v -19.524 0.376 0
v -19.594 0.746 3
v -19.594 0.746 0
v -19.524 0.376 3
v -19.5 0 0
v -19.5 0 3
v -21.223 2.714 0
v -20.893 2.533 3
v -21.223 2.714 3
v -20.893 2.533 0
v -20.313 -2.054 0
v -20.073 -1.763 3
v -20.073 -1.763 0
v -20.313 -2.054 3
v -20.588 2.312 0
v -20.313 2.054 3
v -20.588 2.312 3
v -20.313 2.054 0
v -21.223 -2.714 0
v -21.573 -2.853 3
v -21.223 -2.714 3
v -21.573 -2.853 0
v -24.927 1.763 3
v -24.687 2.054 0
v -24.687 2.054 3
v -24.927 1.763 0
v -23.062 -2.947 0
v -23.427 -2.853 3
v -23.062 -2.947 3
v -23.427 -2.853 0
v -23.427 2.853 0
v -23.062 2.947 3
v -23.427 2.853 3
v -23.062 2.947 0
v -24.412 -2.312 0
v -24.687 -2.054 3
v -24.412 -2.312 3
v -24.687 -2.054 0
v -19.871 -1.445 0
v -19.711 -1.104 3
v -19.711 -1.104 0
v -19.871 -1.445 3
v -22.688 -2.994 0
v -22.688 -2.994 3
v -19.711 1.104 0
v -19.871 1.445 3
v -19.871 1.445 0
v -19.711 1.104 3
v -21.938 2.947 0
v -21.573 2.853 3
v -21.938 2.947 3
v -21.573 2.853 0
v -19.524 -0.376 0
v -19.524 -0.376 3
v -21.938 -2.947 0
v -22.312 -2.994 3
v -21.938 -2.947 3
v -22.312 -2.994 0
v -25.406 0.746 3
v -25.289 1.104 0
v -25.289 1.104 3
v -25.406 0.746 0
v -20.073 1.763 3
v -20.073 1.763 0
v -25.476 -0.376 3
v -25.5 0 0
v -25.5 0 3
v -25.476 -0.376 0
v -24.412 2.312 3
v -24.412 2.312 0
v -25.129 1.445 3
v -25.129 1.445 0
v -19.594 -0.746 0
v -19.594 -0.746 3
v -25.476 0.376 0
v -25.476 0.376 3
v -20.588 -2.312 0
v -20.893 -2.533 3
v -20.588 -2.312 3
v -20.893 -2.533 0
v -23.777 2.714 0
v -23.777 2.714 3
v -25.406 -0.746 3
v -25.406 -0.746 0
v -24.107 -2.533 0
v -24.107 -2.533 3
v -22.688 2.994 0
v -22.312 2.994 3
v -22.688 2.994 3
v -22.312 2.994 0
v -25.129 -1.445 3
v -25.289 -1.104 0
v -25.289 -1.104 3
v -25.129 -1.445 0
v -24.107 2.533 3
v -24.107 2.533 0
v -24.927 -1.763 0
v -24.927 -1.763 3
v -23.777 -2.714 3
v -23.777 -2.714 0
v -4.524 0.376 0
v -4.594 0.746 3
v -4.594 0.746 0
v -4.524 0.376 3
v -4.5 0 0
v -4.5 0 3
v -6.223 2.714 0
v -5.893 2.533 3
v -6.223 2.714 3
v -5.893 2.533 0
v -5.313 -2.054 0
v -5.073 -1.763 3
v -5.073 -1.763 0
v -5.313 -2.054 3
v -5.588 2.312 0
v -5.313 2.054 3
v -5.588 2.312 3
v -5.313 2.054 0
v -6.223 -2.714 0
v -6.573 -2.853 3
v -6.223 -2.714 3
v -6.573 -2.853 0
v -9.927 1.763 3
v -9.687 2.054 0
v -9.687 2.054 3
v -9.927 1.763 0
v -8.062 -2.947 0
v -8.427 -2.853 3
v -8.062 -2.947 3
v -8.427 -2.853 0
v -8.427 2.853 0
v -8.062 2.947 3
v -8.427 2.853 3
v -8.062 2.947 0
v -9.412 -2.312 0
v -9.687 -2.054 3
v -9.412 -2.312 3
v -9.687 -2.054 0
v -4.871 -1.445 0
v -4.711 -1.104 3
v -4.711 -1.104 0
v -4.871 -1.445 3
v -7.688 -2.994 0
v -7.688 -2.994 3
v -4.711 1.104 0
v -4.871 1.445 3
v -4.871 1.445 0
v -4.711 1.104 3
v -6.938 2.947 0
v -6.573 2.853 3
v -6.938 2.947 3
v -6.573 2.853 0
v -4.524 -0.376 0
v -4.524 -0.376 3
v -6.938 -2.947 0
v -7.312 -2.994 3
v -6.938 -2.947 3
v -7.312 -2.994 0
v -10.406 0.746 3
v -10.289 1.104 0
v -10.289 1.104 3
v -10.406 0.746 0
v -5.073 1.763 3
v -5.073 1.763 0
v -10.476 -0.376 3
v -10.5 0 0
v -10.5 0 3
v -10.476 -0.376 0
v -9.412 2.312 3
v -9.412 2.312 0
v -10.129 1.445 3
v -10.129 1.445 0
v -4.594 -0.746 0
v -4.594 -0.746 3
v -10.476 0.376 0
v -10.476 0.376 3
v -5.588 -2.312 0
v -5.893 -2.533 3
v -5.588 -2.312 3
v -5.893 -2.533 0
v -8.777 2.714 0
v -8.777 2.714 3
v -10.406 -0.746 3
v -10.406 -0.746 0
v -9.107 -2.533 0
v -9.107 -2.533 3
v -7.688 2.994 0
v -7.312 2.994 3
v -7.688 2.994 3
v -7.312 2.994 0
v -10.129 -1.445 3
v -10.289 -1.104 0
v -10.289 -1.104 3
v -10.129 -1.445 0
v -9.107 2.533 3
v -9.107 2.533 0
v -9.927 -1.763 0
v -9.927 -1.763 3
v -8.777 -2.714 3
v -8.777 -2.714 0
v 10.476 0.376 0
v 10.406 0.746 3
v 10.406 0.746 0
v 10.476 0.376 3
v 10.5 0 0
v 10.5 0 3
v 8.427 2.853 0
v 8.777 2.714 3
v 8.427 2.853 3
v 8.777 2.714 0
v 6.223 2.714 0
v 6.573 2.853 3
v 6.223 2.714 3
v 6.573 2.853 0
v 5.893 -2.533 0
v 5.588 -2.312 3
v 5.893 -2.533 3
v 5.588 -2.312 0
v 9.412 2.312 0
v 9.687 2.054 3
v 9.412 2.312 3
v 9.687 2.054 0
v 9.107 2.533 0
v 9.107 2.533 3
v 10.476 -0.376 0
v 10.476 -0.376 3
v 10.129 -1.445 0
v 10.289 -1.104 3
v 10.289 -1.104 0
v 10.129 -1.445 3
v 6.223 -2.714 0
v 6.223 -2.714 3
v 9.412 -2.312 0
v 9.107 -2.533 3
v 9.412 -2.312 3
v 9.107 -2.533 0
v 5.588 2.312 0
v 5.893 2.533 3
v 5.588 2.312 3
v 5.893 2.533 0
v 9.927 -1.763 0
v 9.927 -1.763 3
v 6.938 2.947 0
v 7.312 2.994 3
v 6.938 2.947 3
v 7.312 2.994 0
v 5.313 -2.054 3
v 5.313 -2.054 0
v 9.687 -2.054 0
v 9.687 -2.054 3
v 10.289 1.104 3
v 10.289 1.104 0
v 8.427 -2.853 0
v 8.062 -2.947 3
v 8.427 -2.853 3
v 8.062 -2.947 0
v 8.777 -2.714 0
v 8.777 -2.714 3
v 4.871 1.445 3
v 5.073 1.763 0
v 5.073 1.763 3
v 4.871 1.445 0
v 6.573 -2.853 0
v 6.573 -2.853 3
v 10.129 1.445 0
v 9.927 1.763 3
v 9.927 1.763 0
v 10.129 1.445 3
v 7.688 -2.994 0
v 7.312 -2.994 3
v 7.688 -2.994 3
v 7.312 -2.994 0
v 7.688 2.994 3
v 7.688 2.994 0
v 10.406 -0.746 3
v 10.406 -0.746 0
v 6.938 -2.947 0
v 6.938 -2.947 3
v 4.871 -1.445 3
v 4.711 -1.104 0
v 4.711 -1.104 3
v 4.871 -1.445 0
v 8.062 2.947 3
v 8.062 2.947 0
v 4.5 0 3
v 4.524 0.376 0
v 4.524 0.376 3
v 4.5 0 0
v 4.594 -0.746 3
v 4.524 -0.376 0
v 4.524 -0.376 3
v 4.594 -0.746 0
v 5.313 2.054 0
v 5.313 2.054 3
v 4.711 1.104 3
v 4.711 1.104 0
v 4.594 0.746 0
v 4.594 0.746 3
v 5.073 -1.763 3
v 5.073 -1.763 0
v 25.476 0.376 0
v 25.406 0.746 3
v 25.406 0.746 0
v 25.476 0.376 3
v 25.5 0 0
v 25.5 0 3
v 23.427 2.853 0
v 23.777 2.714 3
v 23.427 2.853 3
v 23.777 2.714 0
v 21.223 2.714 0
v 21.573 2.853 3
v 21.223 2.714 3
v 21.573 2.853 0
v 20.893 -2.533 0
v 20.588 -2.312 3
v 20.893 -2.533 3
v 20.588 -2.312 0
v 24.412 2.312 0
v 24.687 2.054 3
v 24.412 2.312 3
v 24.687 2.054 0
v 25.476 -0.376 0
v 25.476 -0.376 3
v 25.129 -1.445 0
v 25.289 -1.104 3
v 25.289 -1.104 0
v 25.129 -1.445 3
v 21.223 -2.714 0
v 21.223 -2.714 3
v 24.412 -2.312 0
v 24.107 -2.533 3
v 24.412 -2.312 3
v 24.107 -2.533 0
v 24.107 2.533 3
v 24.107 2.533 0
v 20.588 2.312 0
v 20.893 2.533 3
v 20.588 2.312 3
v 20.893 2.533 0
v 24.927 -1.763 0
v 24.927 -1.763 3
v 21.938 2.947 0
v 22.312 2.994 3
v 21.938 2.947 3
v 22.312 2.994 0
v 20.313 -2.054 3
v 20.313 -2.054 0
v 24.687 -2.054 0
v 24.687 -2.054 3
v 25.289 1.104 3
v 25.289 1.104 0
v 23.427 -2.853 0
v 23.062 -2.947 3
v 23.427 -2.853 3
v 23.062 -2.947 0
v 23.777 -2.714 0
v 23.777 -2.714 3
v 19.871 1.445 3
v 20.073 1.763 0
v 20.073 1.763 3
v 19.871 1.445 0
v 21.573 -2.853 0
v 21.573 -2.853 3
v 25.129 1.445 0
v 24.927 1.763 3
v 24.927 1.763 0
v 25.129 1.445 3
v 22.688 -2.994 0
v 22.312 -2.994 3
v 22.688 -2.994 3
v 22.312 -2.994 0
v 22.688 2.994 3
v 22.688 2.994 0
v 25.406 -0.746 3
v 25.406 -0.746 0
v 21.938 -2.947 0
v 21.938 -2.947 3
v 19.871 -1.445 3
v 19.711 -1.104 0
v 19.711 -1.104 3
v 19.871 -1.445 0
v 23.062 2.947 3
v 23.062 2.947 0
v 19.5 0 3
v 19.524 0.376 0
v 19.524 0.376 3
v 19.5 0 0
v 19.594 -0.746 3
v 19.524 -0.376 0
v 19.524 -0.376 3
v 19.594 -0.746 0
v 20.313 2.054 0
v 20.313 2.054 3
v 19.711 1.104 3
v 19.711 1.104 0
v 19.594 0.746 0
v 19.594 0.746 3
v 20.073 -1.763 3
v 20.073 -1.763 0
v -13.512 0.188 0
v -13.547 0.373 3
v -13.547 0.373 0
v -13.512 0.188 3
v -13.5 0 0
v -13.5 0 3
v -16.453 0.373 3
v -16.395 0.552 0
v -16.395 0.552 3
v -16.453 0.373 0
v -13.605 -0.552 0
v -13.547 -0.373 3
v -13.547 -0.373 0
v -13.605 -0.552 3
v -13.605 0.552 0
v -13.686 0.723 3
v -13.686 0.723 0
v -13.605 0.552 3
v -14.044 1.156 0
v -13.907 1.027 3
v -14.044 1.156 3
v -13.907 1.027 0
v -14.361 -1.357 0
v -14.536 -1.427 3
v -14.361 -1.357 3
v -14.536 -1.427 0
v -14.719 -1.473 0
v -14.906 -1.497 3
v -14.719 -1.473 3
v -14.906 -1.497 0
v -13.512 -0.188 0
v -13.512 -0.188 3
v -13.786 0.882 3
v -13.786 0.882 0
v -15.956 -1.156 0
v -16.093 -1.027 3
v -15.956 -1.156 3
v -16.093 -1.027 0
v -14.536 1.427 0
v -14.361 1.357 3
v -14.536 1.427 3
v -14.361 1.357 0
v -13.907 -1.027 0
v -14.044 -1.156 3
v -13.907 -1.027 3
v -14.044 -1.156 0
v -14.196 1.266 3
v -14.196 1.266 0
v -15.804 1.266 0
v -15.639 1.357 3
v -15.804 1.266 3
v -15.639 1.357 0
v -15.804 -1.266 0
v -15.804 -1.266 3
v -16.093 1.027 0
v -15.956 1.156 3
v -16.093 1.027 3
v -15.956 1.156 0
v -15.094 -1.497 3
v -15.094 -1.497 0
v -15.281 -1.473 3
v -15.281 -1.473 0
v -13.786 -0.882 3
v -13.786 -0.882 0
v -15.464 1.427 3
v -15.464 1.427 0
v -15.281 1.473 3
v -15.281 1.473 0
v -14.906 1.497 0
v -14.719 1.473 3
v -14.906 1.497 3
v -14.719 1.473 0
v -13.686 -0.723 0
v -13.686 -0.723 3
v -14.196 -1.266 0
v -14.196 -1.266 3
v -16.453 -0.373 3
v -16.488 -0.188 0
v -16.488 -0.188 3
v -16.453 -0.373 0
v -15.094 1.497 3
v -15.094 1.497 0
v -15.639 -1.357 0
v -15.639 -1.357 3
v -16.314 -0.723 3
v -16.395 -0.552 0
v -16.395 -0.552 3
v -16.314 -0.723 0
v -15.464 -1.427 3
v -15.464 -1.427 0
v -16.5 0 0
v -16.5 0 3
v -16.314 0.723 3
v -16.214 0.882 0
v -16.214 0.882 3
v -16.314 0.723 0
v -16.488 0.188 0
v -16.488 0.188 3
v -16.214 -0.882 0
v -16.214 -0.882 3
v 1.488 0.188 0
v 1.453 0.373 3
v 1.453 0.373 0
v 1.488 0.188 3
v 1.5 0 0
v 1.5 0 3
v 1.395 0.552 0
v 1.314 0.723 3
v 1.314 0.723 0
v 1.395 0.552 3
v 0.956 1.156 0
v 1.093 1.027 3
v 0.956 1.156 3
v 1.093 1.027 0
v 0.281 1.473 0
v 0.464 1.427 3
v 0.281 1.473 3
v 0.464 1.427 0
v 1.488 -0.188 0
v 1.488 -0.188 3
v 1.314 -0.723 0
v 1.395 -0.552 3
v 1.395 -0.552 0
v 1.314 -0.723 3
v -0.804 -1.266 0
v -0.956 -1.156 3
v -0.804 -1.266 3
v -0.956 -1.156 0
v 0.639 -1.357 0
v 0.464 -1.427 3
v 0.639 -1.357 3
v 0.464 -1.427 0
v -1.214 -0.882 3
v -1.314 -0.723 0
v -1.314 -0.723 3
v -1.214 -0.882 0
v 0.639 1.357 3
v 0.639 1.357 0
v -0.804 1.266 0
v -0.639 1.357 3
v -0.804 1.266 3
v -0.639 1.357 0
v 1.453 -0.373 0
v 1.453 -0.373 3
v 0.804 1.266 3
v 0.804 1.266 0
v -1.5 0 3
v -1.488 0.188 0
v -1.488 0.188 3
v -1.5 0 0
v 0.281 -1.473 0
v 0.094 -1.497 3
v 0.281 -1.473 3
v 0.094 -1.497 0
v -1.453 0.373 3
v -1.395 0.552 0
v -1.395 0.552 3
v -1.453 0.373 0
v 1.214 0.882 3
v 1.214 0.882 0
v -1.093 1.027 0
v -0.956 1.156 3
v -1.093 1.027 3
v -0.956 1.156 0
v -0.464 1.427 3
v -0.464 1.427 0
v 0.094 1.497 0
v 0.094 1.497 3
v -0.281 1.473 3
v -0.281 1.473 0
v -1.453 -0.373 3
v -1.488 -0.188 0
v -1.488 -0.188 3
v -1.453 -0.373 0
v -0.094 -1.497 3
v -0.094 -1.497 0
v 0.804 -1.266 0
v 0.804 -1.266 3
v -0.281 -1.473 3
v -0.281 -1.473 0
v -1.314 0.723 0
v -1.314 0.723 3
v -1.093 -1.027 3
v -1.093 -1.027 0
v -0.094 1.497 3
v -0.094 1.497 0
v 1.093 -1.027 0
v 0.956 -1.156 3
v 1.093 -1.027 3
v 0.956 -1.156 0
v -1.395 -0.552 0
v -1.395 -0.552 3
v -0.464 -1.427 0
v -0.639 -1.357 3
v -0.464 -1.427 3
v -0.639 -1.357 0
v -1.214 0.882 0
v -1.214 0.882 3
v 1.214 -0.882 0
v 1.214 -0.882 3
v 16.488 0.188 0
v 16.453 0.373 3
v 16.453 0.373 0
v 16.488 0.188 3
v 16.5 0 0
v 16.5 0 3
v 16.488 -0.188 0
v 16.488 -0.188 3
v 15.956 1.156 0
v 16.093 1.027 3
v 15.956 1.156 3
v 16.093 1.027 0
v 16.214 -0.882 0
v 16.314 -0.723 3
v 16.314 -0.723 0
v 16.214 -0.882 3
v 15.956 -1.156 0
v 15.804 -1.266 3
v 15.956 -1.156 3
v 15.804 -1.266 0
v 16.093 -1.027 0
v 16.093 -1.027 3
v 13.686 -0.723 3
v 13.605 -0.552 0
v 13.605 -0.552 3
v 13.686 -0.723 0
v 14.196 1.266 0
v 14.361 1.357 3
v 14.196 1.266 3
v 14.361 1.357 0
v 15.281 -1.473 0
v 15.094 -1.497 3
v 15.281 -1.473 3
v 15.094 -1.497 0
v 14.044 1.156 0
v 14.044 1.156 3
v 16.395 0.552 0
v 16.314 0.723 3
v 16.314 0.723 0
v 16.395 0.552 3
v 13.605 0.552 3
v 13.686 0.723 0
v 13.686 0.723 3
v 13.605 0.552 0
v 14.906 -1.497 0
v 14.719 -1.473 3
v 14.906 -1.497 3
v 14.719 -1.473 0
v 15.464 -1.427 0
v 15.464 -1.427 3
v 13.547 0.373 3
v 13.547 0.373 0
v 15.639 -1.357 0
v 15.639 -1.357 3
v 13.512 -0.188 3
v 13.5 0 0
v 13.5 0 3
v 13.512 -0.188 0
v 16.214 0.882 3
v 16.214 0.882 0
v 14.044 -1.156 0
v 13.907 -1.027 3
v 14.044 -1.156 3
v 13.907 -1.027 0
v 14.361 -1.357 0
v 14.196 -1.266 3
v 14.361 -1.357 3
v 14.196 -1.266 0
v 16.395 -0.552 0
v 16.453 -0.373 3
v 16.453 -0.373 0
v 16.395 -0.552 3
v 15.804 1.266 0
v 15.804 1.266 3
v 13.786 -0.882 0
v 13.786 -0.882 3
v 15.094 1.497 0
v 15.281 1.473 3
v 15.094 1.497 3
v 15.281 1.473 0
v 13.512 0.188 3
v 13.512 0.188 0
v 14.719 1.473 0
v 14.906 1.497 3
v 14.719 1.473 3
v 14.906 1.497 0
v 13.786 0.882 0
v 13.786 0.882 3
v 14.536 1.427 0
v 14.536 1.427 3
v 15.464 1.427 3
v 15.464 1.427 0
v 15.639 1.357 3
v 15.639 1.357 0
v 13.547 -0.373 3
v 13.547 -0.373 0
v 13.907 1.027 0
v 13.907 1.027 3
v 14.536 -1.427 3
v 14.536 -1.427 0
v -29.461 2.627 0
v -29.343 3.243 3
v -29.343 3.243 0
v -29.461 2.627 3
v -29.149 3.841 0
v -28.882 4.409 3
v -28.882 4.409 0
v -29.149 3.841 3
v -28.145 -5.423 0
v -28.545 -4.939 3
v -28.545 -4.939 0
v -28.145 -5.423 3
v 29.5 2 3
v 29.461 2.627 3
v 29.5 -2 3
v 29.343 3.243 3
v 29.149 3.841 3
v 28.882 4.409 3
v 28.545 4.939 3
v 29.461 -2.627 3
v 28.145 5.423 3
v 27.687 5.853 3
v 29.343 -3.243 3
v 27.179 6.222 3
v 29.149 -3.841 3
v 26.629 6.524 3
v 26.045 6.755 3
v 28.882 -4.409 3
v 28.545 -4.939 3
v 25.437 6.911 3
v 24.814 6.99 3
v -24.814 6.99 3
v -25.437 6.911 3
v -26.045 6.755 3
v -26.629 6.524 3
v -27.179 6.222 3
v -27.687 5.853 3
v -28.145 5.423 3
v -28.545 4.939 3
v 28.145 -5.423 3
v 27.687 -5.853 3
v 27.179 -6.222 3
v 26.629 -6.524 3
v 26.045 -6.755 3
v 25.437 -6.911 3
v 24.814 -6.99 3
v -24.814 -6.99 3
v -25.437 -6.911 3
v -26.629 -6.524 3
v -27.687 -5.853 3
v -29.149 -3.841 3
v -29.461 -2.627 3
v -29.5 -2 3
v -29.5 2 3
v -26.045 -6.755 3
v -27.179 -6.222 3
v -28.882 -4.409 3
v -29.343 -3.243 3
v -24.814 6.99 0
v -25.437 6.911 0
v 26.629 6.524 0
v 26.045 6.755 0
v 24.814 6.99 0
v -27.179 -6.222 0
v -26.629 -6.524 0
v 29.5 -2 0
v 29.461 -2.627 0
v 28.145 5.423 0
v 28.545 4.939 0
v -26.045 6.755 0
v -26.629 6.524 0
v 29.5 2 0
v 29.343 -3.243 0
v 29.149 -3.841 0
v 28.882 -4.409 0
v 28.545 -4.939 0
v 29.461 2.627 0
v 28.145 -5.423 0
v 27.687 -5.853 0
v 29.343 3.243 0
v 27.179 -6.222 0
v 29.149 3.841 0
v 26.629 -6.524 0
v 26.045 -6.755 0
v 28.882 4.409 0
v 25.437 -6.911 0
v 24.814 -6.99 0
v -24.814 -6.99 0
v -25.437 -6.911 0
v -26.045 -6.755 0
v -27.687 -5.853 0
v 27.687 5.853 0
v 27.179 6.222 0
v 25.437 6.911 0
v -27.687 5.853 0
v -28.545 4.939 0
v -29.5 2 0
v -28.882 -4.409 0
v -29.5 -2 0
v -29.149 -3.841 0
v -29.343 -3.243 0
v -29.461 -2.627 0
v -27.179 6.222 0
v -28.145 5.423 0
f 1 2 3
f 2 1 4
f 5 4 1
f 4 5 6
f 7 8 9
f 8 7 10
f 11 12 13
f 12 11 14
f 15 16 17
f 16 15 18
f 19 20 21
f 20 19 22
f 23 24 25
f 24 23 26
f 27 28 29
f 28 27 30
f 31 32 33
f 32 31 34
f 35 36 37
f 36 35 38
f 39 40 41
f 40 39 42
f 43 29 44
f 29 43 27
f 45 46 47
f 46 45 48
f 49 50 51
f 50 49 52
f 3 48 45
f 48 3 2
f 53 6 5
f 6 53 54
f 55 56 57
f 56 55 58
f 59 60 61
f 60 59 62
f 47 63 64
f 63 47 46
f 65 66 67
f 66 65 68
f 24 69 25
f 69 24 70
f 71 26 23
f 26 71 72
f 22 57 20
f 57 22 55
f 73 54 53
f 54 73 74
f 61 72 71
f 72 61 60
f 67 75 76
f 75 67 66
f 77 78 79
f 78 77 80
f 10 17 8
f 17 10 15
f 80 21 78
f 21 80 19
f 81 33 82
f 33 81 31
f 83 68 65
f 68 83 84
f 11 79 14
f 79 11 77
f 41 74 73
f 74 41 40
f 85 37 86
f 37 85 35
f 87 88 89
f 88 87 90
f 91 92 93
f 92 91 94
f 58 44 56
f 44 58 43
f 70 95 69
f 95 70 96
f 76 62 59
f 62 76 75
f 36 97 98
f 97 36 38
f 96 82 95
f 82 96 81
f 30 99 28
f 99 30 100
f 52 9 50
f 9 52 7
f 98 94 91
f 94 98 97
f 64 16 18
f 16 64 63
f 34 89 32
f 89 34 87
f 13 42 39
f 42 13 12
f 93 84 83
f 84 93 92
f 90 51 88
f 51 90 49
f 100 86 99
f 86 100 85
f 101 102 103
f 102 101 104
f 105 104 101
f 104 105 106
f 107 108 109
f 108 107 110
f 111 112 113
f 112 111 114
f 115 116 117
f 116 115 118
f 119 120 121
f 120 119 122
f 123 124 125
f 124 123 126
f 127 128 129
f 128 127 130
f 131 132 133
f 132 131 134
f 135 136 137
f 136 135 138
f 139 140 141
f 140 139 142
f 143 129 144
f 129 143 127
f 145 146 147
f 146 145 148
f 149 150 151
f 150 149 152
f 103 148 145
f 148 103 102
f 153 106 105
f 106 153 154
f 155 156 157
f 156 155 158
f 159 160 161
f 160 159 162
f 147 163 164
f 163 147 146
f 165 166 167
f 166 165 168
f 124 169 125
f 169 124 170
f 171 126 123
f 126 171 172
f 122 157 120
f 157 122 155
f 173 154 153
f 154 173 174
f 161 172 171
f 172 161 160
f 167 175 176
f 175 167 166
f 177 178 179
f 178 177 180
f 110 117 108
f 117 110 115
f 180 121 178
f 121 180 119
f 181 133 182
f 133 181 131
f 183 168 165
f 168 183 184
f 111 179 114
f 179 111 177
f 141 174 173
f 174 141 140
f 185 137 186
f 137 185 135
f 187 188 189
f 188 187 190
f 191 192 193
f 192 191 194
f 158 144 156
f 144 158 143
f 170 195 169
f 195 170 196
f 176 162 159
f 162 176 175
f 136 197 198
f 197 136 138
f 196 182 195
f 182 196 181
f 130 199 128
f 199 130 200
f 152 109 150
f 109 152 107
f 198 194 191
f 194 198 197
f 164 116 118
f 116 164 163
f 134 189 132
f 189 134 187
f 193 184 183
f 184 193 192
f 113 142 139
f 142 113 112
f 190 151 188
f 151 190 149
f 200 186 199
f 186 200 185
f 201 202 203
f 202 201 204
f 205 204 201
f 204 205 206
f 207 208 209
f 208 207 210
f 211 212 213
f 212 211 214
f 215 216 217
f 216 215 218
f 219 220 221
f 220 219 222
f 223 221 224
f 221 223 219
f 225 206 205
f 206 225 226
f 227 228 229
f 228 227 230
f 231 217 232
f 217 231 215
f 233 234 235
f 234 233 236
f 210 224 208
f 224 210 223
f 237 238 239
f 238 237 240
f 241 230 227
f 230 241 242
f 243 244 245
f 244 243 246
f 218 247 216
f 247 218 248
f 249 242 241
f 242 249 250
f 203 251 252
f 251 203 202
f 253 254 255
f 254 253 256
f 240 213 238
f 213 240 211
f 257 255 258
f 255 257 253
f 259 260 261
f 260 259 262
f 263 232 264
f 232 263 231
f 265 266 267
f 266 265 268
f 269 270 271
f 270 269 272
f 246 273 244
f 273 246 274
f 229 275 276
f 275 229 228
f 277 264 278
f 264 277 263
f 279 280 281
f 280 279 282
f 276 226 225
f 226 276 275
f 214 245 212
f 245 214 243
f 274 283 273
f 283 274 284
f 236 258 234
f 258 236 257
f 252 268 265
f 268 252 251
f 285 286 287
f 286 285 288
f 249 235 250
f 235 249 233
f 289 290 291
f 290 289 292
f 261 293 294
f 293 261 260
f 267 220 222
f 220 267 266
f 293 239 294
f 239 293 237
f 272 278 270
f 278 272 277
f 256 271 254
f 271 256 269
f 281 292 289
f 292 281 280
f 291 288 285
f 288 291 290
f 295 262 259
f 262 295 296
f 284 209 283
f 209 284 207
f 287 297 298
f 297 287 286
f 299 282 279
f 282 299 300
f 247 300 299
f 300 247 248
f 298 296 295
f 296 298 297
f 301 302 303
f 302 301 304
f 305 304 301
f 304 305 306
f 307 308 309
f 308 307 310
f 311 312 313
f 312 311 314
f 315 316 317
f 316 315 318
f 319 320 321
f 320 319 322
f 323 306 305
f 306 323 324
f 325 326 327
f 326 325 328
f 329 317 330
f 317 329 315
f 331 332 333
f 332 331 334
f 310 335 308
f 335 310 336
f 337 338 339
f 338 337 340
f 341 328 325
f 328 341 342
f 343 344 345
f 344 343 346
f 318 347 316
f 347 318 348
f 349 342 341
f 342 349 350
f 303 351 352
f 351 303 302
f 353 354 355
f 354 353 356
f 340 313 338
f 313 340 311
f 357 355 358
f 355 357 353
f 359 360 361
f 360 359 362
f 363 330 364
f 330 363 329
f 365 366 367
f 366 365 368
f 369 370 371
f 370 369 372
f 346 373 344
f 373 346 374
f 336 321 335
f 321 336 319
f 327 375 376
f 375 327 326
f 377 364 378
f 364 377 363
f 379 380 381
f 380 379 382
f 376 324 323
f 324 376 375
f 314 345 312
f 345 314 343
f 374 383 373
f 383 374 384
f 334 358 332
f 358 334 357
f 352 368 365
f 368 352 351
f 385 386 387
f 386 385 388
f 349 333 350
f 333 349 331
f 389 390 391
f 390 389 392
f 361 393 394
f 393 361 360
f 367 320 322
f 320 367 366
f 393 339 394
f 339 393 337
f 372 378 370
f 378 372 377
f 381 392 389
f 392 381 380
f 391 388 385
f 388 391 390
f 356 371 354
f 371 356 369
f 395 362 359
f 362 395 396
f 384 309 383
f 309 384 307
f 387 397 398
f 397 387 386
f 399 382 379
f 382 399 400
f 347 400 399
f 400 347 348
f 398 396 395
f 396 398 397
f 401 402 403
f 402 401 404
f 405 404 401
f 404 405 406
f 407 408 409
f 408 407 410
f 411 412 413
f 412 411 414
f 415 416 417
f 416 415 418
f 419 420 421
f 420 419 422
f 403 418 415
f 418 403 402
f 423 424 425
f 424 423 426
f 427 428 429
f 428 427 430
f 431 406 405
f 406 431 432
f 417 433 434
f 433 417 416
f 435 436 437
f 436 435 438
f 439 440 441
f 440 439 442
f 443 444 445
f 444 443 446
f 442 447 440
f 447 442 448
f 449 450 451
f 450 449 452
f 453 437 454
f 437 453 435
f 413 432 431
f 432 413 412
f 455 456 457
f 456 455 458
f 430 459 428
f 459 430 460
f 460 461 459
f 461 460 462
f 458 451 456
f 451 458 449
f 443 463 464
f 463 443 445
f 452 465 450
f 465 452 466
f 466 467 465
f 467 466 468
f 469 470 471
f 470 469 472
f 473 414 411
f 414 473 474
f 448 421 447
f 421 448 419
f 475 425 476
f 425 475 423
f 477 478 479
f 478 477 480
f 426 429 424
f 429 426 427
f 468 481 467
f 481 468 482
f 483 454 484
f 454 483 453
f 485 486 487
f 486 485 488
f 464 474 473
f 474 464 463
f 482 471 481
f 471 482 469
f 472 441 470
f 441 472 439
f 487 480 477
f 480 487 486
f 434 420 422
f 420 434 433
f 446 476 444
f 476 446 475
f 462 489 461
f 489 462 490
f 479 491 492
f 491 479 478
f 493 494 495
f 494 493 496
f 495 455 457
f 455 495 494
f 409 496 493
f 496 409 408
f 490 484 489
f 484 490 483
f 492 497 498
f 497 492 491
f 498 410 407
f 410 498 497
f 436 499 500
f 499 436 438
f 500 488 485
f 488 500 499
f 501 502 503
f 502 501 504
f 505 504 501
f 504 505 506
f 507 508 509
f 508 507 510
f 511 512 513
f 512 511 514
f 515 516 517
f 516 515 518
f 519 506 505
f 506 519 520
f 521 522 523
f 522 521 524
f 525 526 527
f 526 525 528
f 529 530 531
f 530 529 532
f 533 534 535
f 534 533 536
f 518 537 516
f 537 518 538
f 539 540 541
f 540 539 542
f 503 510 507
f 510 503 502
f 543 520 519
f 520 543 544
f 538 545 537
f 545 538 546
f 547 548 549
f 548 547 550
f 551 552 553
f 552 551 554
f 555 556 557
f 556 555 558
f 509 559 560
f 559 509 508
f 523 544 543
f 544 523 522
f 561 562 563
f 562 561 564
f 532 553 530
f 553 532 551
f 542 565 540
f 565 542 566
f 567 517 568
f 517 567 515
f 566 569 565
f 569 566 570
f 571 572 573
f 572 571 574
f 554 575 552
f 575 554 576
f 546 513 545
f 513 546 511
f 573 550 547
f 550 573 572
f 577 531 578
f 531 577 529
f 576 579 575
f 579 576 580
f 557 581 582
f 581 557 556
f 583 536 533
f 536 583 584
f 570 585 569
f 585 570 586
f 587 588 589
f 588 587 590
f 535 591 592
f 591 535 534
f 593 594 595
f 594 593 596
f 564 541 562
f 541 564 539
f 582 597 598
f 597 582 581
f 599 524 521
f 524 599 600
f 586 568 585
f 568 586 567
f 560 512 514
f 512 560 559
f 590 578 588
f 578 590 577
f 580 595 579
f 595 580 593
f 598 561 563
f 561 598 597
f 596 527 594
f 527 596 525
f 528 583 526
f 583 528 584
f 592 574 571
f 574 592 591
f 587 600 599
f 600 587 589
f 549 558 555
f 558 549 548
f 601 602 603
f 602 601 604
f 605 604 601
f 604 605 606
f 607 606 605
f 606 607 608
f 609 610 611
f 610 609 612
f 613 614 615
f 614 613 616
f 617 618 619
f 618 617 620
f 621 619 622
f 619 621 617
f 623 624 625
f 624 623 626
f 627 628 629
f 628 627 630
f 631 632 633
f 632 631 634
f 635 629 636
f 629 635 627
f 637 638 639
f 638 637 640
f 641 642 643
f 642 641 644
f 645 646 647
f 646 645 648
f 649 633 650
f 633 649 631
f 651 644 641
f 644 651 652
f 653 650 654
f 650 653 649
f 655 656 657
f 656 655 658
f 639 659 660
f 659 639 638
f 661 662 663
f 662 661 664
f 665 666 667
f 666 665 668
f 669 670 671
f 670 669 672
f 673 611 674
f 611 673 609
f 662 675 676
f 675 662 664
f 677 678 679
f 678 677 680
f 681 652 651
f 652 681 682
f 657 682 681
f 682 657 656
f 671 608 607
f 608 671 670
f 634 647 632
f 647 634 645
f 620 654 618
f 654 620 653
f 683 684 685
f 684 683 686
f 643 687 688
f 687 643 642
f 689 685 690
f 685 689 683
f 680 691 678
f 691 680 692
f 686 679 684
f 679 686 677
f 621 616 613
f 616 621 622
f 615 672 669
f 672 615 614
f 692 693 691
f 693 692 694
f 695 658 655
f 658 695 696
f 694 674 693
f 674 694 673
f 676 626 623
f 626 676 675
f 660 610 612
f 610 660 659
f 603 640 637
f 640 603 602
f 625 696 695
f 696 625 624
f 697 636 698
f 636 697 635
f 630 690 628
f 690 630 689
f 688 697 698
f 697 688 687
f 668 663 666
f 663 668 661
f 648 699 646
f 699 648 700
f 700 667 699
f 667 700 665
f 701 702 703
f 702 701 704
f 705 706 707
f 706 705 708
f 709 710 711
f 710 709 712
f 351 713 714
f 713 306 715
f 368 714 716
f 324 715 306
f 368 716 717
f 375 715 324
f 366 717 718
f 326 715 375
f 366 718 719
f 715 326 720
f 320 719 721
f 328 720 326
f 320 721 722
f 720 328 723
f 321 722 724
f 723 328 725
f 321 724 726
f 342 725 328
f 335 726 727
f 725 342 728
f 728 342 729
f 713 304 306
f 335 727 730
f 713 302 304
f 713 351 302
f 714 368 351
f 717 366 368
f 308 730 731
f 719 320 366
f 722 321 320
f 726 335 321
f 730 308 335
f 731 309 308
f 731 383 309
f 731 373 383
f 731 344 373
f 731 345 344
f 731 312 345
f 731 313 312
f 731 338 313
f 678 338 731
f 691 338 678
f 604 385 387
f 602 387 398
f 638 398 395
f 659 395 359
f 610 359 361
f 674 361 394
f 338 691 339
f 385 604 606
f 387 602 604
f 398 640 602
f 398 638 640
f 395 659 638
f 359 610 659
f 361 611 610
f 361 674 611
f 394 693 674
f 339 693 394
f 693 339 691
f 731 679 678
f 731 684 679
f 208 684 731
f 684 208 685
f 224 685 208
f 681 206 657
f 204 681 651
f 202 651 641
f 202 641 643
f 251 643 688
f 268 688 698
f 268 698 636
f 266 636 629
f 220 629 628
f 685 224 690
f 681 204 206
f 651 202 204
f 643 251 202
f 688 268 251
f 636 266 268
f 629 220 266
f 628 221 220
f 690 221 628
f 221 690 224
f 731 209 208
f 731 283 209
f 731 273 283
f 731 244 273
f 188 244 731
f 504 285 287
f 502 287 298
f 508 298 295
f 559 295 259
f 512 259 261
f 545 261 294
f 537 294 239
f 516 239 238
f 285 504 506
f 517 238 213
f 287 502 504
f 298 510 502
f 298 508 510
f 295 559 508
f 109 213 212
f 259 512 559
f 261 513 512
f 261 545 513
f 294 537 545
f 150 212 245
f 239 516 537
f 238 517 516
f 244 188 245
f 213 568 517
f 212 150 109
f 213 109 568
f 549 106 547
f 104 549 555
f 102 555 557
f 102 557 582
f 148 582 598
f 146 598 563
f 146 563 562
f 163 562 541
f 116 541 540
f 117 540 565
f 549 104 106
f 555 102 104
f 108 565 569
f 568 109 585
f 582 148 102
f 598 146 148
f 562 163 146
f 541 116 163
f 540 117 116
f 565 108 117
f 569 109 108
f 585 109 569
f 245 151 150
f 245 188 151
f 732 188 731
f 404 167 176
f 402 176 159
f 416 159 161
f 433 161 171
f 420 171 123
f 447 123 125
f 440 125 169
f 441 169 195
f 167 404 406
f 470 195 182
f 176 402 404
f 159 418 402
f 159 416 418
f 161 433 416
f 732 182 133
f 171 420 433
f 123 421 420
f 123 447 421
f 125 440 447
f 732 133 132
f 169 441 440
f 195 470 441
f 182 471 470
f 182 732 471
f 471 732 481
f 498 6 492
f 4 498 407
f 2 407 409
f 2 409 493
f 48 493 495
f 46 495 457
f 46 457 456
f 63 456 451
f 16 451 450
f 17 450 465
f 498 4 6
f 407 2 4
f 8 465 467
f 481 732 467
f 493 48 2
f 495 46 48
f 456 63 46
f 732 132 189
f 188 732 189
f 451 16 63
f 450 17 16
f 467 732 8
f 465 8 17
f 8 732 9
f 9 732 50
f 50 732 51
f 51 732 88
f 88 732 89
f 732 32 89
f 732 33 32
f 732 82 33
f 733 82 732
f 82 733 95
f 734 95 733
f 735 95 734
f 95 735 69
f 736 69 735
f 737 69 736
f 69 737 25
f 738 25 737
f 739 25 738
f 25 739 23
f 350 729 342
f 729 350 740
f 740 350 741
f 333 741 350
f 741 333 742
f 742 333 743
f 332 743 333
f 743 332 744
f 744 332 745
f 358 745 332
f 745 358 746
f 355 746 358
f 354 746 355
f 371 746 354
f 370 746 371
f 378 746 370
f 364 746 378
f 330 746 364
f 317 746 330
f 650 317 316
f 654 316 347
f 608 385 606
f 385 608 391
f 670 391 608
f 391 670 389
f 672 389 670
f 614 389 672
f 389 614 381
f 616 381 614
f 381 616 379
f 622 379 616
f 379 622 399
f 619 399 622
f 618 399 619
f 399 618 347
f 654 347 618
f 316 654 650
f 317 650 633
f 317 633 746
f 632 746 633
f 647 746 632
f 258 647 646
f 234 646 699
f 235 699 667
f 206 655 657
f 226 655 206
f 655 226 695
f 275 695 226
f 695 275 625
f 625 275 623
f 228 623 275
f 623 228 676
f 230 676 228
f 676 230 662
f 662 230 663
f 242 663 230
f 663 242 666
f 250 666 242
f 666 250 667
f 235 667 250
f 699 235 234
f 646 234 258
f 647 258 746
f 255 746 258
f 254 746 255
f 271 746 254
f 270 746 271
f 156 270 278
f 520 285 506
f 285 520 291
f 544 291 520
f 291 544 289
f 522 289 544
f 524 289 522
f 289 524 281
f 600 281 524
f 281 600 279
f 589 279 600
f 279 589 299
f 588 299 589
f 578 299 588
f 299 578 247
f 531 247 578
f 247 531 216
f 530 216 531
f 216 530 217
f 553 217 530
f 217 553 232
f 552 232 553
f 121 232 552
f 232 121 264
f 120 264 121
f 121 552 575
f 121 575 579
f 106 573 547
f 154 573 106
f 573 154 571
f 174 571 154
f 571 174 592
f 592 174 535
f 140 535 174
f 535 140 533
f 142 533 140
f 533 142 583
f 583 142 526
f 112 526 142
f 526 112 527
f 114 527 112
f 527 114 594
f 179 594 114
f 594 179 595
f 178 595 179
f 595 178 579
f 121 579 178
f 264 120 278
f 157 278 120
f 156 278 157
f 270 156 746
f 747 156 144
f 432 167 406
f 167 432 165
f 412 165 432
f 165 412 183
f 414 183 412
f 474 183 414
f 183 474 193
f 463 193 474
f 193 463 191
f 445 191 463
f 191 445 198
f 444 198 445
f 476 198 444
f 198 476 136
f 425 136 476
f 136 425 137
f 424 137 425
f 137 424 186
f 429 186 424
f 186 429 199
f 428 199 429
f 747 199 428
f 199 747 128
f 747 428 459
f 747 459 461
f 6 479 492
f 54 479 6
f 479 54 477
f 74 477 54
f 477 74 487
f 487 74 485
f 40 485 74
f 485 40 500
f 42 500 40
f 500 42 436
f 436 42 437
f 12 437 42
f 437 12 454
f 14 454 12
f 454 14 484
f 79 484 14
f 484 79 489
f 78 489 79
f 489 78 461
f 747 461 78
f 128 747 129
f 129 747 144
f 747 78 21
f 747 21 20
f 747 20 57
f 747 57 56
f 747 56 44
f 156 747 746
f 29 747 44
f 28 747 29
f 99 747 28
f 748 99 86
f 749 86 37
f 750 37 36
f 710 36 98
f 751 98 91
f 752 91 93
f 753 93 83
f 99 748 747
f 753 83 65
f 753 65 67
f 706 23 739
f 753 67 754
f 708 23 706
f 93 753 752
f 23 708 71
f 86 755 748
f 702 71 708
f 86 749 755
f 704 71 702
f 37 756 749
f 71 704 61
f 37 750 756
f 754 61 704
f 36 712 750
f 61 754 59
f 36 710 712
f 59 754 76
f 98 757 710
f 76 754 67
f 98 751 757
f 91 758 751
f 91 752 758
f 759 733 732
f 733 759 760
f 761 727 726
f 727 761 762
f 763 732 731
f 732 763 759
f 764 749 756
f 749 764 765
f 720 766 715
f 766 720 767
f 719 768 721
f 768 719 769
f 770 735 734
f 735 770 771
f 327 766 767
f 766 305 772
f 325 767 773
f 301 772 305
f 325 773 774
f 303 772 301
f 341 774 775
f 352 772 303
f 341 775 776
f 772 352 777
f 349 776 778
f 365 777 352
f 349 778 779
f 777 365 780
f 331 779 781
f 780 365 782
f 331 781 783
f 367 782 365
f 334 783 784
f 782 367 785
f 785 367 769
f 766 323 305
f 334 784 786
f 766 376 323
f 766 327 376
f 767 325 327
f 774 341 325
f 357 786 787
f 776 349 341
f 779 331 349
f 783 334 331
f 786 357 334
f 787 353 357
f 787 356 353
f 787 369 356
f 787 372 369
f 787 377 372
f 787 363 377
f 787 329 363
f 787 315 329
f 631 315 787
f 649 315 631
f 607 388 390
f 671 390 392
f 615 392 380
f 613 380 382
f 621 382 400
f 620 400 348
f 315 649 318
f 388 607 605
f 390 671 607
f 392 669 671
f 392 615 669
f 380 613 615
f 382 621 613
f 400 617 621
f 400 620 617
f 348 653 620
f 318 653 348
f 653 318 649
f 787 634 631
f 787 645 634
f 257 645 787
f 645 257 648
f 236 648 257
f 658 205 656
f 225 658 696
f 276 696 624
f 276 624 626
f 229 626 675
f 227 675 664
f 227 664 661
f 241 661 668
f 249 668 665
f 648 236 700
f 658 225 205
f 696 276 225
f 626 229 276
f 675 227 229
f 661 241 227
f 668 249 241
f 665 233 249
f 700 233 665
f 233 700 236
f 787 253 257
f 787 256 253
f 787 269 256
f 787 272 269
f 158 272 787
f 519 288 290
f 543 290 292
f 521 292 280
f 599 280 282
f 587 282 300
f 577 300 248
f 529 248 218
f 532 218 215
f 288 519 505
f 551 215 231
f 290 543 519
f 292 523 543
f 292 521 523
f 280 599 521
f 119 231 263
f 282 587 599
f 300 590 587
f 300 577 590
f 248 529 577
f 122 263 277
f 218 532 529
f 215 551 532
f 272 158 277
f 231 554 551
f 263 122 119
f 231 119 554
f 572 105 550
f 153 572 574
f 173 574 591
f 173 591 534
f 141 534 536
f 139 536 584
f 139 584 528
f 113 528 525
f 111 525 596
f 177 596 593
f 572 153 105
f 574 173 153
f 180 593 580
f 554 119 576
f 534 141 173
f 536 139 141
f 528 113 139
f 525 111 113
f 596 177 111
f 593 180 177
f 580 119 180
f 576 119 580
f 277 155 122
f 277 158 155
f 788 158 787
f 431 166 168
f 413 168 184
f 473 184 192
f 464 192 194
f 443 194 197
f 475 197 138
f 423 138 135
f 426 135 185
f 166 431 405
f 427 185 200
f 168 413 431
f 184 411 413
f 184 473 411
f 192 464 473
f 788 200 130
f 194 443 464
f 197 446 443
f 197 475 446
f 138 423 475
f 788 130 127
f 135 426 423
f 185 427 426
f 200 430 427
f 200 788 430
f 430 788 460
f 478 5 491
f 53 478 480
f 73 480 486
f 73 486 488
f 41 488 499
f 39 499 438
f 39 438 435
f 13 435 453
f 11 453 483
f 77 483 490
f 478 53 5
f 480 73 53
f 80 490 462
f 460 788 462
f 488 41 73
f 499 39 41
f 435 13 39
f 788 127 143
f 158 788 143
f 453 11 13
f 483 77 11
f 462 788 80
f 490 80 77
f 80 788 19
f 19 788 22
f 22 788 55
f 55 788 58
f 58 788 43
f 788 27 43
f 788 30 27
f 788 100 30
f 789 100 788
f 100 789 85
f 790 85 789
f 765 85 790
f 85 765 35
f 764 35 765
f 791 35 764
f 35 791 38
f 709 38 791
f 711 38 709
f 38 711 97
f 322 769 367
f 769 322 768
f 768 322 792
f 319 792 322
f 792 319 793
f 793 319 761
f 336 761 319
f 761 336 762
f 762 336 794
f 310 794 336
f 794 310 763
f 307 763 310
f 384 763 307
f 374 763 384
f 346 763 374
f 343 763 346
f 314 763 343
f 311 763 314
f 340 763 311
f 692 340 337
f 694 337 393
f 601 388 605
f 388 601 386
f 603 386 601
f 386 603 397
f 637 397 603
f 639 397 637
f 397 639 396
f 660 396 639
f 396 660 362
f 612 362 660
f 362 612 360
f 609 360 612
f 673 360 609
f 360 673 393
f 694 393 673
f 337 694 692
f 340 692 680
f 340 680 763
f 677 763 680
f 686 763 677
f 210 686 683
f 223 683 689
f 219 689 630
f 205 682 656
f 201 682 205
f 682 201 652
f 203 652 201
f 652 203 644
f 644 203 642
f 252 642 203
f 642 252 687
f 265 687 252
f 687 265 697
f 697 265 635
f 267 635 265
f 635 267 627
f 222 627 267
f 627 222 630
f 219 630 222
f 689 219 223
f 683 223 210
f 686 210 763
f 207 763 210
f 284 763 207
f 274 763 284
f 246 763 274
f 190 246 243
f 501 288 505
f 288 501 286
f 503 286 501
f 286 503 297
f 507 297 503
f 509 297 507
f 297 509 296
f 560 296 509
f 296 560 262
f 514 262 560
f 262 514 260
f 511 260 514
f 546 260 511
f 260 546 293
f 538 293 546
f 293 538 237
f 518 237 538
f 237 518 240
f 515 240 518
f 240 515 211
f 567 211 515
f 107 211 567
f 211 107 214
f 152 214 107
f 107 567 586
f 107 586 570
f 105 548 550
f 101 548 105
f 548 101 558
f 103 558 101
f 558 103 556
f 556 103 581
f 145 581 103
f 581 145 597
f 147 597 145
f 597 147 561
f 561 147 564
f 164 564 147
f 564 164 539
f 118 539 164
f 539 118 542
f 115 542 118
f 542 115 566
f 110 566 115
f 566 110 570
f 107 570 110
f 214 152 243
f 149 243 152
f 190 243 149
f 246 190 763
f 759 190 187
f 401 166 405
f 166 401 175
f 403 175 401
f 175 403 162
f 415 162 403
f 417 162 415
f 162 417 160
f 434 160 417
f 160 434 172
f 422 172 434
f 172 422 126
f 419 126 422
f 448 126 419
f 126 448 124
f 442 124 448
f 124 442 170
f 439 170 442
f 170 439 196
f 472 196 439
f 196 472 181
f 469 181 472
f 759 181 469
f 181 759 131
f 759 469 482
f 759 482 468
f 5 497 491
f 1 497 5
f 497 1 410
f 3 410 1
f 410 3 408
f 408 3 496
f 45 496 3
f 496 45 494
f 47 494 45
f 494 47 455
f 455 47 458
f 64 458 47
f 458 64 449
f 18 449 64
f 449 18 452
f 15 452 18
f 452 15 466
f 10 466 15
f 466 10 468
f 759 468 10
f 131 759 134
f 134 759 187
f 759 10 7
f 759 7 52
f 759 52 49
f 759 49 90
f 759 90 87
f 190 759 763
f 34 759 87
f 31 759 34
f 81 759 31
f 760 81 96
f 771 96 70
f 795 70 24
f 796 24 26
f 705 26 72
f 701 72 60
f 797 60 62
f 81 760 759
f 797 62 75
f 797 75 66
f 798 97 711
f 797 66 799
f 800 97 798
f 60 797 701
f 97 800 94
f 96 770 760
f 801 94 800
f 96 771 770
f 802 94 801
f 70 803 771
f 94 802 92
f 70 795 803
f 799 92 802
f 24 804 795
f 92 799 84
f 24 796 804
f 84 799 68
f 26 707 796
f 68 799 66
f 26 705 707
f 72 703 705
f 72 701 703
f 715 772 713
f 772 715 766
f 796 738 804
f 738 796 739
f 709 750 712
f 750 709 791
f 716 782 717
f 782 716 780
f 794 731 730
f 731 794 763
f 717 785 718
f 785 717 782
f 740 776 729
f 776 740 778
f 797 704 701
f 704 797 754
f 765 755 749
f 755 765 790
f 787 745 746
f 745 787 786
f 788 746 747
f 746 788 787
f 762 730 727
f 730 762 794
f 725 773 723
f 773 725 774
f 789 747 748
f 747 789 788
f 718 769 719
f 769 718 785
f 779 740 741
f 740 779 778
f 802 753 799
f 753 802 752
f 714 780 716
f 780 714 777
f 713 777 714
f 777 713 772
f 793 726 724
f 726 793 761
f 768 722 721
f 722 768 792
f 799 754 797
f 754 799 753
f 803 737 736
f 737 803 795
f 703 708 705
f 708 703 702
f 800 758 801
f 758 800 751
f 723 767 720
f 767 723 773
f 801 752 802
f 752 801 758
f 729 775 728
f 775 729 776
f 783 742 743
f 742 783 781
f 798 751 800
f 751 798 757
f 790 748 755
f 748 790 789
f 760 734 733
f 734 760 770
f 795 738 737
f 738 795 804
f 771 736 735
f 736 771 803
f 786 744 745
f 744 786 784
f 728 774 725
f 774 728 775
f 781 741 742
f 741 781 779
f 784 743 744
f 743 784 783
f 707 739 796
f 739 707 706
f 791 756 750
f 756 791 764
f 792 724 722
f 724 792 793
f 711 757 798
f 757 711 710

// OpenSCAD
$fn = 50;


difference() {
	union() {
		*color(alpha = 1.0000000000, c = "gray") {
			translate(v = [0, 7, 0]) {
				linear_extrude(height = 1) {
					text(font = "Arial:style=Bold", halign = "center", size = 4.5000000000, text = "COMMENT plate main", valign = "center");
				}
			}
		}
		hull() {
			translate(v = [-24.5000000000, 2.0000000000, 0]) {
				cylinder(h = 3, r = 5);
			}
			translate(v = [24.5000000000, 2.0000000000, 0]) {
				cylinder(h = 3, r = 5);
			}
			translate(v = [-24.5000000000, -2.0000000000, 0]) {
				cylinder(h = 3, r = 5);
			}
			translate(v = [24.5000000000, -2.0000000000, 0]) {
				cylinder(h = 3, r = 5);
			}
		}
	}
	union() {
		*color(alpha = 1.0000000000, c = "gray") {
			translate(v = [0, 7, 0]) {
				linear_extrude(height = 1) {
					text(font = "Arial:style=Bold", halign = "center", size = 4.5000000000, text = "COMMENT holes main", valign = "center");
				}
			}
		}
		translate(v = [-22.5000000000, 0.0000000000, 0]) {
			translate(v = [0, 0, -100]) {
				cylinder(h = 200, r = 3.0000000000);
			}
		}
		translate(v = [-7.5000000000, 0.0000000000, 0]) {
			translate(v = [0, 0, -100]) {
				cylinder(h = 200, r = 3.0000000000);
			}
		}
		translate(v = [7.5000000000, 0.0000000000, 0]) {
			translate(v = [0, 0, -100]) {
				cylinder(h = 200, r = 3.0000000000);
			}
		}
		translate(v = [22.5000000000, 0.0000000000, 0]) {
			translate(v = [0, 0, -100]) {
				cylinder(h = 200, r = 3.0000000000);
			}
		}
		translate(v = [-22.5000000000, 0.0000000000, 0]) {
			translate(v = [0, 0, -100]) {
				cylinder(h = 200, r = 1.5000000000);
			}
		}
		translate(v = [-15.0000000000, 0.0000000000, 0]) {
			translate(v = [0, 0, -100]) {
				cylinder(h = 200, r = 1.5000000000);
			}
		}
		translate(v = [-7.5000000000, 0.0000000000, 0]) {
			translate(v = [0, 0, -100]) {
				cylinder(h = 200, r = 1.5000000000);
			}
		}
		translate(v = [0, 0, -100]) {
			cylinder(h = 200, r = 1.5000000000);
		}
		translate(v = [7.5000000000, 0.0000000000, 0]) {
			translate(v = [0, 0, -100]) {
				cylinder(h = 200, r = 1.5000000000);
			}
		}
		translate(v = [15.0000000000, 0.0000000000, 0]) {
			translate(v = [0, 0, -100]) {
				cylinder(h = 200, r = 1.5000000000);
			}
		}
		translate(v = [22.5000000000, 0.0000000000, 0]) {
			translate(v = [0, 0, -100]) {
				cylinder(h = 200, r = 1.5000000000);
			}
		}
	}
}
